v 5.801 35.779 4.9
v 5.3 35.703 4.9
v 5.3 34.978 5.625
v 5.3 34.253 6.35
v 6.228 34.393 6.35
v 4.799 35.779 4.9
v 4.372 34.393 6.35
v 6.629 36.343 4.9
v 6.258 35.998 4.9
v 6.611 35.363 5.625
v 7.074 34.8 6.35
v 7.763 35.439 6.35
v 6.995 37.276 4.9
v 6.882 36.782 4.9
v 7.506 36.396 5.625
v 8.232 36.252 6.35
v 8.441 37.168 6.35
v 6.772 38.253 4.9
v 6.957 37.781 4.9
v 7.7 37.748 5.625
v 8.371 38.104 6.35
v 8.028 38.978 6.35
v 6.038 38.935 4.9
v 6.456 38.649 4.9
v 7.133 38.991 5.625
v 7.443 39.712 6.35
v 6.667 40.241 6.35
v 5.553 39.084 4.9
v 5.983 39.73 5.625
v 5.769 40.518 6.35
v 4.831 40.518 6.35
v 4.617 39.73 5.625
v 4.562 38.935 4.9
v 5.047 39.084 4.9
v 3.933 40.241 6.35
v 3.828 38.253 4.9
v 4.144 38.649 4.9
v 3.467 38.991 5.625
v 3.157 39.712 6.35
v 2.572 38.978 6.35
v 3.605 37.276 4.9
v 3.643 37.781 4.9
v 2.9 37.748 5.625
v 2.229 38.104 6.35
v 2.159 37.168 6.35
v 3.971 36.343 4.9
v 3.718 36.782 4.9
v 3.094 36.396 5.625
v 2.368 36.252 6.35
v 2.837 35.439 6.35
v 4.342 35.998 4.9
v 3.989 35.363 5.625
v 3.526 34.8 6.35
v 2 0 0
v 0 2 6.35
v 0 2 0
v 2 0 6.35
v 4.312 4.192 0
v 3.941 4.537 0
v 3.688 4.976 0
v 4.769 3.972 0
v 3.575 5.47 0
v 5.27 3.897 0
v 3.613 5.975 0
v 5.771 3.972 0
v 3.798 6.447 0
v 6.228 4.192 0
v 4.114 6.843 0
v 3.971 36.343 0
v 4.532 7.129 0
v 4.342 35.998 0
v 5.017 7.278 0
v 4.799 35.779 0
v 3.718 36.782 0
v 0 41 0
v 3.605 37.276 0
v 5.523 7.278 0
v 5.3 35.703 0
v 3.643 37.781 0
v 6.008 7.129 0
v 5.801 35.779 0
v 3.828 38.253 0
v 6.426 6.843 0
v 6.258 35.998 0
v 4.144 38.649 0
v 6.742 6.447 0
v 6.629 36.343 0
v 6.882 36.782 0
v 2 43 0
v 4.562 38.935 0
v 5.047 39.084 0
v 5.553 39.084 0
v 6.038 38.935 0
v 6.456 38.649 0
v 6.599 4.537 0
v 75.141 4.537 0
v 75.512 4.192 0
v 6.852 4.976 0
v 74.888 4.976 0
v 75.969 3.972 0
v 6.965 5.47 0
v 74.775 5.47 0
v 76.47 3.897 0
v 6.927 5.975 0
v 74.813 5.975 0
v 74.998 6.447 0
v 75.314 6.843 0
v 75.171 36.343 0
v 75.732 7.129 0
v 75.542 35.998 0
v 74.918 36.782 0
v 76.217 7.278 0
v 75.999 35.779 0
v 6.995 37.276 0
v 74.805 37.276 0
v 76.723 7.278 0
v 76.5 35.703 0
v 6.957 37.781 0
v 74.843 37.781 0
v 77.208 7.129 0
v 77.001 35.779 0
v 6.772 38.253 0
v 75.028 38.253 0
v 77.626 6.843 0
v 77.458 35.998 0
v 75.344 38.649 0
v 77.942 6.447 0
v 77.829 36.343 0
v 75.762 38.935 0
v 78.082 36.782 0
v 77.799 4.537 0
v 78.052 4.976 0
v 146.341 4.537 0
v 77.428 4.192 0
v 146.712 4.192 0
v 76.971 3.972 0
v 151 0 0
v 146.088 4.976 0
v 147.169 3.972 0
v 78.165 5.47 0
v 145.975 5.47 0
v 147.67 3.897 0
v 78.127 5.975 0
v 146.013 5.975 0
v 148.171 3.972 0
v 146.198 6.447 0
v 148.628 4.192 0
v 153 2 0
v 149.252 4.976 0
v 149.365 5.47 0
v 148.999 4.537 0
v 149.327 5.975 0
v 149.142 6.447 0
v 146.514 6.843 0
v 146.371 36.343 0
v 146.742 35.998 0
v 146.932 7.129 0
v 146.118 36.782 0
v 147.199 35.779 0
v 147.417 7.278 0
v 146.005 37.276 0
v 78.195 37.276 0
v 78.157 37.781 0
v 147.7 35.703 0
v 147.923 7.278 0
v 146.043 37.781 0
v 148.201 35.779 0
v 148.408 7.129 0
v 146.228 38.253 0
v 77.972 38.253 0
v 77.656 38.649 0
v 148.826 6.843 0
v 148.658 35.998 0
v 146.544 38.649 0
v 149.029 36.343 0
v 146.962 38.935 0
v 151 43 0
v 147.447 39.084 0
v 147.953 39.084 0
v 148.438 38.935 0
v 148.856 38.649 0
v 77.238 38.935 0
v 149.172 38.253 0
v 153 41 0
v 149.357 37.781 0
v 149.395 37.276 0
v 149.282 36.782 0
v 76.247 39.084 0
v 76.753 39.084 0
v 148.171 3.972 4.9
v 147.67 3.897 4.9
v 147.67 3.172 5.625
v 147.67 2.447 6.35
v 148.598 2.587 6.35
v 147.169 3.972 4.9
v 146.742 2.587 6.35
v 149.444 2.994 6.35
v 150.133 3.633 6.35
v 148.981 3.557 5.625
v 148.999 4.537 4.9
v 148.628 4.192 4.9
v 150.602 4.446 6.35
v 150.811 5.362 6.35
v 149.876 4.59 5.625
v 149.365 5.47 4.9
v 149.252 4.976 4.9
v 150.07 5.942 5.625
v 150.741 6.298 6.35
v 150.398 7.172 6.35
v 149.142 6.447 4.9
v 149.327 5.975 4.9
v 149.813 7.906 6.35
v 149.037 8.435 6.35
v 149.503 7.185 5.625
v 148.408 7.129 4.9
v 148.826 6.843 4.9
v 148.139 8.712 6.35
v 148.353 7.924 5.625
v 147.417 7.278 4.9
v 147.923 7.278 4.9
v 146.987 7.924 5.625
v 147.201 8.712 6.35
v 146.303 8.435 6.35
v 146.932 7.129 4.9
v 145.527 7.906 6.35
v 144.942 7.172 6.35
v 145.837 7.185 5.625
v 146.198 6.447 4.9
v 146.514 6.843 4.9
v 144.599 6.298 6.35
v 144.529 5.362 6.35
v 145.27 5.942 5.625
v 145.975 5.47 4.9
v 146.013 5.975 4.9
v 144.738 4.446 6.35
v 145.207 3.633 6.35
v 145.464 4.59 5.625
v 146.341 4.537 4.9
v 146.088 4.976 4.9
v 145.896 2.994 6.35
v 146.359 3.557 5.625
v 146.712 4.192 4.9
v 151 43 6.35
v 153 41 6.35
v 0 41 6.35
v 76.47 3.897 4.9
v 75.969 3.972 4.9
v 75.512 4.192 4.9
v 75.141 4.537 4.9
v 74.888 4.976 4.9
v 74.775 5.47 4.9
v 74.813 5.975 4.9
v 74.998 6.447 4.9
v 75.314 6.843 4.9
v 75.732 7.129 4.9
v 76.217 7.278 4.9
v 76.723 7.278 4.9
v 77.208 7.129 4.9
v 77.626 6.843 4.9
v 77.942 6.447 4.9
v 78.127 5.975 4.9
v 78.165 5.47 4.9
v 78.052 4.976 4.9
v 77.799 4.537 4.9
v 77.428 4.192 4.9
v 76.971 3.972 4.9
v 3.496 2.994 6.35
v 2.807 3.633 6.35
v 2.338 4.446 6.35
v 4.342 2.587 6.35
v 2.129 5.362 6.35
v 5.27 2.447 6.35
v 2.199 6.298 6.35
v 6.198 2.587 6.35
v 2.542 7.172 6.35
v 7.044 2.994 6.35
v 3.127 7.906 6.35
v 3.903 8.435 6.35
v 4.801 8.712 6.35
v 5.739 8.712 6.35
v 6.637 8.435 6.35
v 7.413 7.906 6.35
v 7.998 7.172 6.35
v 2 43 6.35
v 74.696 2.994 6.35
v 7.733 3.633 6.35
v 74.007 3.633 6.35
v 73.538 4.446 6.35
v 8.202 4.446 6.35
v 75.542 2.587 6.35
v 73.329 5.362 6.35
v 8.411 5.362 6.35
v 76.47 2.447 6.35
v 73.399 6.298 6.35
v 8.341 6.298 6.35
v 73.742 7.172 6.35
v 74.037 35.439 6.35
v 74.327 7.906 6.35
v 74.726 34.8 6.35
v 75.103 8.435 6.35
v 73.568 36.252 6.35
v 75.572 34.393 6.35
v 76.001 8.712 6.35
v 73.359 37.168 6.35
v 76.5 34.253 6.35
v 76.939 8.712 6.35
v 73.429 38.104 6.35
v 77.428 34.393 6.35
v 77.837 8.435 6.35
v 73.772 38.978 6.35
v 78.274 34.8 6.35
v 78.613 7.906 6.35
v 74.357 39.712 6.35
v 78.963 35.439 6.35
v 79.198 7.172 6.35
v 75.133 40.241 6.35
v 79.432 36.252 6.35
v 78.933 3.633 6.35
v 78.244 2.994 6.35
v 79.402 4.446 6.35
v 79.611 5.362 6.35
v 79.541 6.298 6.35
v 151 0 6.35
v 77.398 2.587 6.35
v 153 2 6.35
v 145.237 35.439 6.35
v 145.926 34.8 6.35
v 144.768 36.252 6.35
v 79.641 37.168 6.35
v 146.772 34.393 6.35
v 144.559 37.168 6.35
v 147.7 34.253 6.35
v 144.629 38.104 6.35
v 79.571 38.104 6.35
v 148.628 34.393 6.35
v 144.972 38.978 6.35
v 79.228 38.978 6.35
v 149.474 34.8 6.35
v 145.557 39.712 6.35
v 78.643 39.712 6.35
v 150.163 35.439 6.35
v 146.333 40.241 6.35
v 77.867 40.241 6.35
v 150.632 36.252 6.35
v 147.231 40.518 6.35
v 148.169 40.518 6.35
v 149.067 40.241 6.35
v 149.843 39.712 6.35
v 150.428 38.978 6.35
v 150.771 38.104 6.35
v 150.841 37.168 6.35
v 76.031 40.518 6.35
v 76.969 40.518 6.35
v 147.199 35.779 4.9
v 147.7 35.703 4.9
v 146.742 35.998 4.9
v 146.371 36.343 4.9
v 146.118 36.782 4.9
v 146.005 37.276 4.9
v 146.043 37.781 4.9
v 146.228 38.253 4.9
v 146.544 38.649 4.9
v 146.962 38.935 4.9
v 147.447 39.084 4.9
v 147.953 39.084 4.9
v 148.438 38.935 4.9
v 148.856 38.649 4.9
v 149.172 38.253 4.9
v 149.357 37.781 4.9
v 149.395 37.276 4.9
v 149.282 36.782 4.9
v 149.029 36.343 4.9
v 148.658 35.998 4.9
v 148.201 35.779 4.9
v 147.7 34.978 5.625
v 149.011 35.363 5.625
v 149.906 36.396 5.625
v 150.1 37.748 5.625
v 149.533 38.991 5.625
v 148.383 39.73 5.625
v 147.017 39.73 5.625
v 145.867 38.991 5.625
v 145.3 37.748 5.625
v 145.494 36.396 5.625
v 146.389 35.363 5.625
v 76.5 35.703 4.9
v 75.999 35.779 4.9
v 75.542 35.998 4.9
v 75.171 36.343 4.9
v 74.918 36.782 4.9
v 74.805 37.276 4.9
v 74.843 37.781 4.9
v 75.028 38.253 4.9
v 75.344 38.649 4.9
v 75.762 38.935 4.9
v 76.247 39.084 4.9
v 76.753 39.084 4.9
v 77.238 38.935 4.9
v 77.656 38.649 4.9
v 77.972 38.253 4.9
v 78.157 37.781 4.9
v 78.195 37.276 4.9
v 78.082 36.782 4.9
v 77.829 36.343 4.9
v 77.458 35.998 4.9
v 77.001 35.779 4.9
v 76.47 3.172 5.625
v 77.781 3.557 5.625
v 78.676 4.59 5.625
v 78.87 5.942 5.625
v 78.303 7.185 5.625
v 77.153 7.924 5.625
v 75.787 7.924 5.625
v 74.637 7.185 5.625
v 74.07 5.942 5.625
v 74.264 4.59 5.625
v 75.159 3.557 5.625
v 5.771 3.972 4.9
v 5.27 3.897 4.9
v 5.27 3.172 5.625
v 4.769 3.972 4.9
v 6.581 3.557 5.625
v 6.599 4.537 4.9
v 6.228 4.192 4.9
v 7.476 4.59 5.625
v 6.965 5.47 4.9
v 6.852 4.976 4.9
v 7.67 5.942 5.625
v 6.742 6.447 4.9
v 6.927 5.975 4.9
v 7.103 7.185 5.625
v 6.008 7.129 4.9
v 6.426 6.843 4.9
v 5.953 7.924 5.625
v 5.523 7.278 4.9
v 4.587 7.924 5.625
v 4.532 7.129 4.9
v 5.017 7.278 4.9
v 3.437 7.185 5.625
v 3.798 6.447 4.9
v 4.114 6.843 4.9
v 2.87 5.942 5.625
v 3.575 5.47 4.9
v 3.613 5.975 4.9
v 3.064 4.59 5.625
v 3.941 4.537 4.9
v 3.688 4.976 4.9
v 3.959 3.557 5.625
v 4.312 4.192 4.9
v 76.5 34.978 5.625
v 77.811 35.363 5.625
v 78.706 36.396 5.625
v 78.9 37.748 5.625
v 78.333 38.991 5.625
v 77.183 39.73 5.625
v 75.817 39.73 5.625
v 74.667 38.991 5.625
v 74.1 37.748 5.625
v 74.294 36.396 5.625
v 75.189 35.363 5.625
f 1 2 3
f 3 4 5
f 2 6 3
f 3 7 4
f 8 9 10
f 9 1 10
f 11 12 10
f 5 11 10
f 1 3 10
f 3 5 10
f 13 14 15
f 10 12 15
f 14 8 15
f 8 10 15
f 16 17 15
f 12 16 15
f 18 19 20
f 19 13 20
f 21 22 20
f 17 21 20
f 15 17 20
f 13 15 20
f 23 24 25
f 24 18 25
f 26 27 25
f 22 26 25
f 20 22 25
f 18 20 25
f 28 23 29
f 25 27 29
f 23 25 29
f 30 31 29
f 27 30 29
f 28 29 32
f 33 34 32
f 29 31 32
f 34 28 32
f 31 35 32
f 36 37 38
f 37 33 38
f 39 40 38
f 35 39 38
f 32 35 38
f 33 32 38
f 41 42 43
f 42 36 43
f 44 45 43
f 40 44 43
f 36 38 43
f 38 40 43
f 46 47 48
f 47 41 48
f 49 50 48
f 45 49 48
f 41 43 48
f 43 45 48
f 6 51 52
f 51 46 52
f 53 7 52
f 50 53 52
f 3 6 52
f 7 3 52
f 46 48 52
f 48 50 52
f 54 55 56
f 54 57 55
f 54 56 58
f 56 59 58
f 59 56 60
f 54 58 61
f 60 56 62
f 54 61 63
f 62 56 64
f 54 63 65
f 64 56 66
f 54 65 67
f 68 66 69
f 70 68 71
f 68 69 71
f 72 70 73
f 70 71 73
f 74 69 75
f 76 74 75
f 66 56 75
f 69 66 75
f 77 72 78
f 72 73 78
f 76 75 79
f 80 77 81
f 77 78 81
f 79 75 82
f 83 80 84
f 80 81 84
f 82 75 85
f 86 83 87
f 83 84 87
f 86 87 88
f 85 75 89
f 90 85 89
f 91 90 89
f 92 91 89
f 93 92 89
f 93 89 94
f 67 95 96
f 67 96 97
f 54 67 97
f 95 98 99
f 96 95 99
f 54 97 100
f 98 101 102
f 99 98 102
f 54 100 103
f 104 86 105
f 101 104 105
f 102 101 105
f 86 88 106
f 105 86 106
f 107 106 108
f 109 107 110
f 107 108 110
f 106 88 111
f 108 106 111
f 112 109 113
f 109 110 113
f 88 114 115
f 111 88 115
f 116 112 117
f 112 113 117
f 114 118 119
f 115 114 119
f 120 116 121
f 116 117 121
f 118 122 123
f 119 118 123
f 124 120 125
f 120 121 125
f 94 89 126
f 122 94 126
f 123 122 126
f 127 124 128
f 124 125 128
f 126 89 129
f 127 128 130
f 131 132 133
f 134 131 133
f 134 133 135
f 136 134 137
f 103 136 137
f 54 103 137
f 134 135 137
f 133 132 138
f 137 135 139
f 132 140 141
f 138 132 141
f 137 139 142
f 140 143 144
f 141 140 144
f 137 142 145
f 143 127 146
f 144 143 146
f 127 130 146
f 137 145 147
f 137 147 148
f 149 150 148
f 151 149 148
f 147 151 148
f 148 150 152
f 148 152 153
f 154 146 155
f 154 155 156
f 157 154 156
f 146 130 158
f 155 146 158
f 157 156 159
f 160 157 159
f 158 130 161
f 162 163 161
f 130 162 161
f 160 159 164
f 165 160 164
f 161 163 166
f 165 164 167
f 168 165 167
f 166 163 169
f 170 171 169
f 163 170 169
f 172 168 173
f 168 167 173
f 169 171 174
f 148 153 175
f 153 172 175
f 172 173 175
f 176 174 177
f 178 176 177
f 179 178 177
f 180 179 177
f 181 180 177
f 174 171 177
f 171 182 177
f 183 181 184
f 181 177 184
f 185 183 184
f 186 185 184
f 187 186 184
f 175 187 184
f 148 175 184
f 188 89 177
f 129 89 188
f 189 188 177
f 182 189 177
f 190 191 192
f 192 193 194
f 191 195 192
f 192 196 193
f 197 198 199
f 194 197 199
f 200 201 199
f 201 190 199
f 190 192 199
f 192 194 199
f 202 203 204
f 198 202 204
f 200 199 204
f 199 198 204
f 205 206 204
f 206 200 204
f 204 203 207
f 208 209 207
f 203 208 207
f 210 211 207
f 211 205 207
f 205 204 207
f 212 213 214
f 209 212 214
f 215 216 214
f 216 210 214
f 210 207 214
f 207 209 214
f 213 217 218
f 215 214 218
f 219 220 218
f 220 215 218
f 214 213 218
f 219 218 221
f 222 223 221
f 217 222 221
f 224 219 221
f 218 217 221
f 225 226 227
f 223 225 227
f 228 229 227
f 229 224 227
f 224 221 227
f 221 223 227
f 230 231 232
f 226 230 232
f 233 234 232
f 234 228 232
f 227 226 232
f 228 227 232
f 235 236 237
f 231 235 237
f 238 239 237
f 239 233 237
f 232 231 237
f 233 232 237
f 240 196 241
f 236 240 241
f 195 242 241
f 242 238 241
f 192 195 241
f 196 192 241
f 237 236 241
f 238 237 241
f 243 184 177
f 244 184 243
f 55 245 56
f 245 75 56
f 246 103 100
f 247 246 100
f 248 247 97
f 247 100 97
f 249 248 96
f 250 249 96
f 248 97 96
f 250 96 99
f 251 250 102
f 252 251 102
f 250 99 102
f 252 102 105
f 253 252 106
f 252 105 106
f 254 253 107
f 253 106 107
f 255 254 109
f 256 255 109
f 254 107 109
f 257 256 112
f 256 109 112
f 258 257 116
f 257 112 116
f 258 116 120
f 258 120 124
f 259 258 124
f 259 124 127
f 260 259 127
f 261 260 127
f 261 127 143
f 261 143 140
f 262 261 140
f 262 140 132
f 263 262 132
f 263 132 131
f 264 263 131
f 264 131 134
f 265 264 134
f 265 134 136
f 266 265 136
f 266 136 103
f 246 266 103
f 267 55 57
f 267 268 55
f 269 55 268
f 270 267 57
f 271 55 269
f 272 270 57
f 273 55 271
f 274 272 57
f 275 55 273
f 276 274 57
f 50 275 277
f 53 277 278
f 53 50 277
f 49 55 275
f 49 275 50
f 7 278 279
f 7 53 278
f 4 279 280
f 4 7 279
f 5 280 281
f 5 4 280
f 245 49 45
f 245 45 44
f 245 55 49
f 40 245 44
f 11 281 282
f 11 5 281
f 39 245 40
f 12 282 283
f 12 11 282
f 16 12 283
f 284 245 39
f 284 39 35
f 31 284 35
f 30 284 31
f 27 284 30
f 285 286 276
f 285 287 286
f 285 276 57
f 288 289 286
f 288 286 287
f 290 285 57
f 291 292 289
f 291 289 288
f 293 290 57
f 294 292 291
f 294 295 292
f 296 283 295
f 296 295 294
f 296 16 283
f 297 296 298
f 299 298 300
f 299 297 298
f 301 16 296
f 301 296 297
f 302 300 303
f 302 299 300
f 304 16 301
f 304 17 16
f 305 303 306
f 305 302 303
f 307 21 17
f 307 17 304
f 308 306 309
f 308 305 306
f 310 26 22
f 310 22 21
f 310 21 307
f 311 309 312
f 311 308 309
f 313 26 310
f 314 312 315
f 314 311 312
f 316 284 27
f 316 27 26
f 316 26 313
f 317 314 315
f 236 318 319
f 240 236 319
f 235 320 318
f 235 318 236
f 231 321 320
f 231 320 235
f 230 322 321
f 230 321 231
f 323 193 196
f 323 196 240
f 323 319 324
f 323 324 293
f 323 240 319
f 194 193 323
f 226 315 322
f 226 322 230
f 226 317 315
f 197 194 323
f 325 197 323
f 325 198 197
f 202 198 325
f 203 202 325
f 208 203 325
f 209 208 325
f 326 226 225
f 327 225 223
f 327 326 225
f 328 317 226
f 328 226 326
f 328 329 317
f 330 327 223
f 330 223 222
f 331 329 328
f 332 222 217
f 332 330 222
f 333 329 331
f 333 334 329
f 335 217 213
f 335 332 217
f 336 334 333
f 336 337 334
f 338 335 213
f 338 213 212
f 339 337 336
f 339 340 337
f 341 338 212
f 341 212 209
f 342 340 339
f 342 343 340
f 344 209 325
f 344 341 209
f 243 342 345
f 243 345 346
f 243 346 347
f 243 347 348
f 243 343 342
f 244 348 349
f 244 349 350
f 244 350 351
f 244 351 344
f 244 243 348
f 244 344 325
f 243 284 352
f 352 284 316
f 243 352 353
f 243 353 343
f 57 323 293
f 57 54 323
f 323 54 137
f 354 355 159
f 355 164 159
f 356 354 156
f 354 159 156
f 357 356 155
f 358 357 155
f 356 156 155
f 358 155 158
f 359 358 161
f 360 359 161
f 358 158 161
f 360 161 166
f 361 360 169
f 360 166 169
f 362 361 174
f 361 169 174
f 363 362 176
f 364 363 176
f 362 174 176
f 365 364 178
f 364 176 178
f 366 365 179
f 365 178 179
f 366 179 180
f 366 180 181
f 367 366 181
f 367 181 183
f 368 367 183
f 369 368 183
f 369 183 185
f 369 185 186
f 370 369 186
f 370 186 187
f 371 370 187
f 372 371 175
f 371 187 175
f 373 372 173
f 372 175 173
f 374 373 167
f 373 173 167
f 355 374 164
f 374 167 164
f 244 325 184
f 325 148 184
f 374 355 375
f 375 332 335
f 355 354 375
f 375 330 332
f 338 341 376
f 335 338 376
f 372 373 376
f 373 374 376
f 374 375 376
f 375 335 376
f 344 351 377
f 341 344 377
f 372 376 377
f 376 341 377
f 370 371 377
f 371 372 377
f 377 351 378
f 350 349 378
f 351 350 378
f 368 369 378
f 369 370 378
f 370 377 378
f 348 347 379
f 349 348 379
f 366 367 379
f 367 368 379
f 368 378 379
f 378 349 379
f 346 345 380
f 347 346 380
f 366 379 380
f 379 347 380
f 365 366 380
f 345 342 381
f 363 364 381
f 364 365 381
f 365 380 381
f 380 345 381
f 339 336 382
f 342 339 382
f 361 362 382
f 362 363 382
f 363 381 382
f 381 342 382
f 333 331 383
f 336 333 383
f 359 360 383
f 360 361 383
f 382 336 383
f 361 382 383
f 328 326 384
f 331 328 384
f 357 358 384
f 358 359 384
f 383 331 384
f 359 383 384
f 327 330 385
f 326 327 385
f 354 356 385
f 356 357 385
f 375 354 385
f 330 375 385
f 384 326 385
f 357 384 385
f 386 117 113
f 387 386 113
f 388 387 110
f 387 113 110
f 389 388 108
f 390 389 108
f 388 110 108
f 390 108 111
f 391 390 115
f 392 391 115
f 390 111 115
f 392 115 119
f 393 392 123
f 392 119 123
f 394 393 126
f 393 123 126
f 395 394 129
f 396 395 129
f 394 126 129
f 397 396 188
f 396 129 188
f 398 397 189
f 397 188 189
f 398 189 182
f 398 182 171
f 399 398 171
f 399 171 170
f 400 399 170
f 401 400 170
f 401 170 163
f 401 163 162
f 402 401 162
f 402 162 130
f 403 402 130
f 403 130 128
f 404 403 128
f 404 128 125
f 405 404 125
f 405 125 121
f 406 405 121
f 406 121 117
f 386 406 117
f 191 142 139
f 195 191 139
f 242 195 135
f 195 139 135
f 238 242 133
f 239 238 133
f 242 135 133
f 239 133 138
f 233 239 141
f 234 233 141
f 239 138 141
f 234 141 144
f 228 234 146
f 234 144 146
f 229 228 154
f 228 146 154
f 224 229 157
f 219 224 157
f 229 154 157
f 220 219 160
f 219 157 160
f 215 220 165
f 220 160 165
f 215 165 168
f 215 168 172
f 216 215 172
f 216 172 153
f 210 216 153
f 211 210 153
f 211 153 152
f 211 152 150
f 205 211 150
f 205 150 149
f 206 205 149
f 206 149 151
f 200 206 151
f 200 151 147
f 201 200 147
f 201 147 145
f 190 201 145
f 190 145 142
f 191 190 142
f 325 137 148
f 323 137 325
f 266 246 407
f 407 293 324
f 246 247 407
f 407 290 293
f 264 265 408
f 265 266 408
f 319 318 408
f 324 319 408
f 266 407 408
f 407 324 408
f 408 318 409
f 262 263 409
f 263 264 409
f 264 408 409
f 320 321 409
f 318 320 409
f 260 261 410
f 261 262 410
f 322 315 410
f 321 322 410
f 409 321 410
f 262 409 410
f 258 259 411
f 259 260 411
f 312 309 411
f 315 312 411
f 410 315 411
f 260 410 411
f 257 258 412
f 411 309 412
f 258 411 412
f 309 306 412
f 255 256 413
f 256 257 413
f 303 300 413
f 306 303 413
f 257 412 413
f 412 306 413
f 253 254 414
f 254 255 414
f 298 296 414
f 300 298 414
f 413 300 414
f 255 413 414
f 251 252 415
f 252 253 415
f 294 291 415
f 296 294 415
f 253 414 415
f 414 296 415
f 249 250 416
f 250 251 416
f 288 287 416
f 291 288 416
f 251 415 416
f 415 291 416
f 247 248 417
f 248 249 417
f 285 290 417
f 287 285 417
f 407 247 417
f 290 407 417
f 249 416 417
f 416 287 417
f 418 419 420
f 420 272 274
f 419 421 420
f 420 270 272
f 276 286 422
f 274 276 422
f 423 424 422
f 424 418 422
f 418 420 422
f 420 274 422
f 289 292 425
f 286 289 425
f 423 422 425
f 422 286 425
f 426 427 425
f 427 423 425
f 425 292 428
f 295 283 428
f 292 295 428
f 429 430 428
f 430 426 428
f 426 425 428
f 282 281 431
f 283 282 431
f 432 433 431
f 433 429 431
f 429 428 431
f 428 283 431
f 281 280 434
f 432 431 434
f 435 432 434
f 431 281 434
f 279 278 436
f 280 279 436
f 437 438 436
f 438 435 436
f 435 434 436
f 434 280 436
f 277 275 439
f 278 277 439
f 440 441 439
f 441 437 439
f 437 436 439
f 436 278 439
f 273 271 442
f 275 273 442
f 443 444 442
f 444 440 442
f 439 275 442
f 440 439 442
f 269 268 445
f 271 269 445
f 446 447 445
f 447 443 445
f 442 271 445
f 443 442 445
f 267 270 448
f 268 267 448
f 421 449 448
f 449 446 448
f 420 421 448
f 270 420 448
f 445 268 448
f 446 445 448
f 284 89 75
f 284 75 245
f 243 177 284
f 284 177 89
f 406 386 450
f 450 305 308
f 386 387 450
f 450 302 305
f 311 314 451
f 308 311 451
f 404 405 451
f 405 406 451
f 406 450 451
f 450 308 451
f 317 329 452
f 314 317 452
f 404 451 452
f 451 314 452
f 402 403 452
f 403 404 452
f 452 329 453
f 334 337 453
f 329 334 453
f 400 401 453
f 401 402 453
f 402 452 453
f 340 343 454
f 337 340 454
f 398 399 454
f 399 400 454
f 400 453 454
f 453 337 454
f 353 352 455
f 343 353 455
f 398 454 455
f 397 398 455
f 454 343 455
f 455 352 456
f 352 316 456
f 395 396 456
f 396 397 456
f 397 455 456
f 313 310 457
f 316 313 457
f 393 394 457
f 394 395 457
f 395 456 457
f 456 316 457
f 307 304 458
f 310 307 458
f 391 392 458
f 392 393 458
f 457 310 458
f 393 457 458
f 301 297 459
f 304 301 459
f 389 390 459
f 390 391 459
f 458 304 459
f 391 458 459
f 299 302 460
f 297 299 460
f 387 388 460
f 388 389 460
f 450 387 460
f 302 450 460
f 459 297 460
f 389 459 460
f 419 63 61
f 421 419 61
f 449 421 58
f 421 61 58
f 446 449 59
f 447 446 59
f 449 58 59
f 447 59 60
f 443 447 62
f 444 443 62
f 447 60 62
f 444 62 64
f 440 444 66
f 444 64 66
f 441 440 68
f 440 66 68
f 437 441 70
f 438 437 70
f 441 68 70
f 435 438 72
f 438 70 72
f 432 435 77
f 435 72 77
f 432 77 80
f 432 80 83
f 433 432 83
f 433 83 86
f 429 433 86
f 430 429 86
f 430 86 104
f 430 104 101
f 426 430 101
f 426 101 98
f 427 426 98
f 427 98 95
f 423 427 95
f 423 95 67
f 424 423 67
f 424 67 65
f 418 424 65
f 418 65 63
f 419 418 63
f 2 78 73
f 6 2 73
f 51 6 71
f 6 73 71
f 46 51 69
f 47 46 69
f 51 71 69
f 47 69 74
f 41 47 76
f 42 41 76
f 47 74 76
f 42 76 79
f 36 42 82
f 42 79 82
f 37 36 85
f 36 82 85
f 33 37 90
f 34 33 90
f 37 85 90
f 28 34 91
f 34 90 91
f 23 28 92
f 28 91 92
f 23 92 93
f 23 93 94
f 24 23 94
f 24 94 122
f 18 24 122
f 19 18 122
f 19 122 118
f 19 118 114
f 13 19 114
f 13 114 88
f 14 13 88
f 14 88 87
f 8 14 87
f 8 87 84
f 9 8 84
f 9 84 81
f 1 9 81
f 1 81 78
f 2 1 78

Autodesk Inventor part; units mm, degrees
ref_plane "YZ Plane" through (0, 0, 0) normal (1, 0, 0) x (0, 1, 0)
ref_plane "XZ Plane" through (0, 0, 0) normal (0, 1, 0) x (-1, 0, 0)
ref_plane "XY Plane" through (0, 0, 0) normal (0, 0, 1) x (1, 0, 0)
sketch "Sketch1" plane through (0, 0, 0) normal (0, 0, 1) x (1, 0, 0)
  line L0 (0, 0) -> (153, 0)
  line L1 (153, 0) -> (153, 43)
  line L2 (153, 43) -> (0, 43)
  line L3 (0, 43) -> (0, 0)
  dimension "d0" = 43
  dimension "d1" = 153
extrude "Extrusion1" add sketch "Sketch1" along normal blind 6.35
chamfer "Chamfer1" distance 2 angle 45 4 edges at (0, 43, 3.175) (0, 0, 3.175) (153, 43, 3.175) (153, 0, 3.175)
ref_plane "Work Plane1" through (2, 21.5, 0) normal (0, 1, 0) x (1, 0, 0)
ref_plane "Work Plane2" through (76.5, 2, 0) normal (1, 0, 0) x (0, 0, -1)
sketch "Sketch2" plane through (0, 0, 6.35) normal (0, 0, 1) x (1, 0, 0)
  line L0 (137.7, 37.4031) -> (143.5031, 31.6) projected
  line L1 (149.525, 31.6) -> (143.5031, 31.6) projected
  line L2 (152.7, 34.775) -> (149.525, 31.6) projected
  line L3 (152.7, 43.2063) -> (152.7, 34.775) projected
  line L4 (152.7, 43.2063) -> (0.3, 43.2063) projected
  line L5 (0.3, 34.775) -> (0.3, 43.2063) projected
  line L6 (3.475, 31.6) -> (0.3, 34.775) projected
  line L7 (9.4969, 31.6) -> (3.475, 31.6) projected
  line L8 (9.4969, 31.6) -> (15.3, 37.4031) projected
  line L9 (15.3, 37.4031) -> (66.5, 37.4031) projected
  line L10 (66.5, 37.4031) -> (72.3031, 31.6) projected
  line L11 (80.6969, 31.6) -> (72.3031, 31.6) projected
  line L12 (80.6969, 31.6) -> (86.5, 37.4031) projected
  line L13 (86.5, 37.4031) -> (137.7, 37.4031) projected
  circle A0 centre (76.5, 37.4031) radius 1.7018 projected
  circle A1 centre (147.7, 37.4031) radius 1.7018 projected
  circle A2 centre (5.3, 37.4031) radius 1.7018 projected
  line L14 (15.27, 5.5969) -> (9.4669, 11.4) projected
  line L15 (3.445, 11.4) -> (9.4669, 11.4) projected
  line L16 (0.27, 8.225) -> (3.445, 11.4) projected
  line L17 (0.27, -0.2063) -> (0.27, 8.225) projected
  line L18 (0.27, -0.2063) -> (152.67, -0.2063) projected
  line L19 (152.67, 8.225) -> (152.67, -0.2063) projected
  line L20 (149.495, 11.4) -> (152.67, 8.225) projected
  line L21 (143.4731, 11.4) -> (149.495, 11.4) projected
  line L22 (143.4731, 11.4) -> (137.67, 5.5969) projected
  line L23 (137.67, 5.5969) -> (86.47, 5.5969) projected
  line L24 (86.47, 5.5969) -> (80.6669, 11.4) projected
  line L25 (72.2731, 11.4) -> (80.6669, 11.4) projected
  line L26 (72.2731, 11.4) -> (66.47, 5.5969) projected
  line L27 (66.47, 5.5969) -> (15.27, 5.5969) projected
  circle A3 centre (76.47, 5.5969) radius 1.7018 projected
  circle A4 centre (5.27, 5.5969) radius 1.7018 projected
  circle A5 centre (147.67, 5.5969) radius 1.7018 projected
  point P0 (0, 0)
  point P1 (76.47, 5.5969)
  point P2 (5.27, 5.5969)
  point P3 (147.67, 5.5969)
hole "Hole1" at (147.7, 37.4031, 6.35) at (76.5, 37.4031, 6.35) at (5.3, 37.4031, 6.35) at (5.27, 5.5969, 6.35) at (76.47, 5.5969, 6.35) at (147.67, 5.5969, 6.35) direction (0, 0, -1) diameter 3.4 depth 8 tip angle 118 countersink diameter 6.3 countersink angle 90 clearance for "Flat Head Machine Screw" size "M3" standard "Ansi Metric M Profile"
properties part number "Rear Armor" material "Polyethylene, High Density"
